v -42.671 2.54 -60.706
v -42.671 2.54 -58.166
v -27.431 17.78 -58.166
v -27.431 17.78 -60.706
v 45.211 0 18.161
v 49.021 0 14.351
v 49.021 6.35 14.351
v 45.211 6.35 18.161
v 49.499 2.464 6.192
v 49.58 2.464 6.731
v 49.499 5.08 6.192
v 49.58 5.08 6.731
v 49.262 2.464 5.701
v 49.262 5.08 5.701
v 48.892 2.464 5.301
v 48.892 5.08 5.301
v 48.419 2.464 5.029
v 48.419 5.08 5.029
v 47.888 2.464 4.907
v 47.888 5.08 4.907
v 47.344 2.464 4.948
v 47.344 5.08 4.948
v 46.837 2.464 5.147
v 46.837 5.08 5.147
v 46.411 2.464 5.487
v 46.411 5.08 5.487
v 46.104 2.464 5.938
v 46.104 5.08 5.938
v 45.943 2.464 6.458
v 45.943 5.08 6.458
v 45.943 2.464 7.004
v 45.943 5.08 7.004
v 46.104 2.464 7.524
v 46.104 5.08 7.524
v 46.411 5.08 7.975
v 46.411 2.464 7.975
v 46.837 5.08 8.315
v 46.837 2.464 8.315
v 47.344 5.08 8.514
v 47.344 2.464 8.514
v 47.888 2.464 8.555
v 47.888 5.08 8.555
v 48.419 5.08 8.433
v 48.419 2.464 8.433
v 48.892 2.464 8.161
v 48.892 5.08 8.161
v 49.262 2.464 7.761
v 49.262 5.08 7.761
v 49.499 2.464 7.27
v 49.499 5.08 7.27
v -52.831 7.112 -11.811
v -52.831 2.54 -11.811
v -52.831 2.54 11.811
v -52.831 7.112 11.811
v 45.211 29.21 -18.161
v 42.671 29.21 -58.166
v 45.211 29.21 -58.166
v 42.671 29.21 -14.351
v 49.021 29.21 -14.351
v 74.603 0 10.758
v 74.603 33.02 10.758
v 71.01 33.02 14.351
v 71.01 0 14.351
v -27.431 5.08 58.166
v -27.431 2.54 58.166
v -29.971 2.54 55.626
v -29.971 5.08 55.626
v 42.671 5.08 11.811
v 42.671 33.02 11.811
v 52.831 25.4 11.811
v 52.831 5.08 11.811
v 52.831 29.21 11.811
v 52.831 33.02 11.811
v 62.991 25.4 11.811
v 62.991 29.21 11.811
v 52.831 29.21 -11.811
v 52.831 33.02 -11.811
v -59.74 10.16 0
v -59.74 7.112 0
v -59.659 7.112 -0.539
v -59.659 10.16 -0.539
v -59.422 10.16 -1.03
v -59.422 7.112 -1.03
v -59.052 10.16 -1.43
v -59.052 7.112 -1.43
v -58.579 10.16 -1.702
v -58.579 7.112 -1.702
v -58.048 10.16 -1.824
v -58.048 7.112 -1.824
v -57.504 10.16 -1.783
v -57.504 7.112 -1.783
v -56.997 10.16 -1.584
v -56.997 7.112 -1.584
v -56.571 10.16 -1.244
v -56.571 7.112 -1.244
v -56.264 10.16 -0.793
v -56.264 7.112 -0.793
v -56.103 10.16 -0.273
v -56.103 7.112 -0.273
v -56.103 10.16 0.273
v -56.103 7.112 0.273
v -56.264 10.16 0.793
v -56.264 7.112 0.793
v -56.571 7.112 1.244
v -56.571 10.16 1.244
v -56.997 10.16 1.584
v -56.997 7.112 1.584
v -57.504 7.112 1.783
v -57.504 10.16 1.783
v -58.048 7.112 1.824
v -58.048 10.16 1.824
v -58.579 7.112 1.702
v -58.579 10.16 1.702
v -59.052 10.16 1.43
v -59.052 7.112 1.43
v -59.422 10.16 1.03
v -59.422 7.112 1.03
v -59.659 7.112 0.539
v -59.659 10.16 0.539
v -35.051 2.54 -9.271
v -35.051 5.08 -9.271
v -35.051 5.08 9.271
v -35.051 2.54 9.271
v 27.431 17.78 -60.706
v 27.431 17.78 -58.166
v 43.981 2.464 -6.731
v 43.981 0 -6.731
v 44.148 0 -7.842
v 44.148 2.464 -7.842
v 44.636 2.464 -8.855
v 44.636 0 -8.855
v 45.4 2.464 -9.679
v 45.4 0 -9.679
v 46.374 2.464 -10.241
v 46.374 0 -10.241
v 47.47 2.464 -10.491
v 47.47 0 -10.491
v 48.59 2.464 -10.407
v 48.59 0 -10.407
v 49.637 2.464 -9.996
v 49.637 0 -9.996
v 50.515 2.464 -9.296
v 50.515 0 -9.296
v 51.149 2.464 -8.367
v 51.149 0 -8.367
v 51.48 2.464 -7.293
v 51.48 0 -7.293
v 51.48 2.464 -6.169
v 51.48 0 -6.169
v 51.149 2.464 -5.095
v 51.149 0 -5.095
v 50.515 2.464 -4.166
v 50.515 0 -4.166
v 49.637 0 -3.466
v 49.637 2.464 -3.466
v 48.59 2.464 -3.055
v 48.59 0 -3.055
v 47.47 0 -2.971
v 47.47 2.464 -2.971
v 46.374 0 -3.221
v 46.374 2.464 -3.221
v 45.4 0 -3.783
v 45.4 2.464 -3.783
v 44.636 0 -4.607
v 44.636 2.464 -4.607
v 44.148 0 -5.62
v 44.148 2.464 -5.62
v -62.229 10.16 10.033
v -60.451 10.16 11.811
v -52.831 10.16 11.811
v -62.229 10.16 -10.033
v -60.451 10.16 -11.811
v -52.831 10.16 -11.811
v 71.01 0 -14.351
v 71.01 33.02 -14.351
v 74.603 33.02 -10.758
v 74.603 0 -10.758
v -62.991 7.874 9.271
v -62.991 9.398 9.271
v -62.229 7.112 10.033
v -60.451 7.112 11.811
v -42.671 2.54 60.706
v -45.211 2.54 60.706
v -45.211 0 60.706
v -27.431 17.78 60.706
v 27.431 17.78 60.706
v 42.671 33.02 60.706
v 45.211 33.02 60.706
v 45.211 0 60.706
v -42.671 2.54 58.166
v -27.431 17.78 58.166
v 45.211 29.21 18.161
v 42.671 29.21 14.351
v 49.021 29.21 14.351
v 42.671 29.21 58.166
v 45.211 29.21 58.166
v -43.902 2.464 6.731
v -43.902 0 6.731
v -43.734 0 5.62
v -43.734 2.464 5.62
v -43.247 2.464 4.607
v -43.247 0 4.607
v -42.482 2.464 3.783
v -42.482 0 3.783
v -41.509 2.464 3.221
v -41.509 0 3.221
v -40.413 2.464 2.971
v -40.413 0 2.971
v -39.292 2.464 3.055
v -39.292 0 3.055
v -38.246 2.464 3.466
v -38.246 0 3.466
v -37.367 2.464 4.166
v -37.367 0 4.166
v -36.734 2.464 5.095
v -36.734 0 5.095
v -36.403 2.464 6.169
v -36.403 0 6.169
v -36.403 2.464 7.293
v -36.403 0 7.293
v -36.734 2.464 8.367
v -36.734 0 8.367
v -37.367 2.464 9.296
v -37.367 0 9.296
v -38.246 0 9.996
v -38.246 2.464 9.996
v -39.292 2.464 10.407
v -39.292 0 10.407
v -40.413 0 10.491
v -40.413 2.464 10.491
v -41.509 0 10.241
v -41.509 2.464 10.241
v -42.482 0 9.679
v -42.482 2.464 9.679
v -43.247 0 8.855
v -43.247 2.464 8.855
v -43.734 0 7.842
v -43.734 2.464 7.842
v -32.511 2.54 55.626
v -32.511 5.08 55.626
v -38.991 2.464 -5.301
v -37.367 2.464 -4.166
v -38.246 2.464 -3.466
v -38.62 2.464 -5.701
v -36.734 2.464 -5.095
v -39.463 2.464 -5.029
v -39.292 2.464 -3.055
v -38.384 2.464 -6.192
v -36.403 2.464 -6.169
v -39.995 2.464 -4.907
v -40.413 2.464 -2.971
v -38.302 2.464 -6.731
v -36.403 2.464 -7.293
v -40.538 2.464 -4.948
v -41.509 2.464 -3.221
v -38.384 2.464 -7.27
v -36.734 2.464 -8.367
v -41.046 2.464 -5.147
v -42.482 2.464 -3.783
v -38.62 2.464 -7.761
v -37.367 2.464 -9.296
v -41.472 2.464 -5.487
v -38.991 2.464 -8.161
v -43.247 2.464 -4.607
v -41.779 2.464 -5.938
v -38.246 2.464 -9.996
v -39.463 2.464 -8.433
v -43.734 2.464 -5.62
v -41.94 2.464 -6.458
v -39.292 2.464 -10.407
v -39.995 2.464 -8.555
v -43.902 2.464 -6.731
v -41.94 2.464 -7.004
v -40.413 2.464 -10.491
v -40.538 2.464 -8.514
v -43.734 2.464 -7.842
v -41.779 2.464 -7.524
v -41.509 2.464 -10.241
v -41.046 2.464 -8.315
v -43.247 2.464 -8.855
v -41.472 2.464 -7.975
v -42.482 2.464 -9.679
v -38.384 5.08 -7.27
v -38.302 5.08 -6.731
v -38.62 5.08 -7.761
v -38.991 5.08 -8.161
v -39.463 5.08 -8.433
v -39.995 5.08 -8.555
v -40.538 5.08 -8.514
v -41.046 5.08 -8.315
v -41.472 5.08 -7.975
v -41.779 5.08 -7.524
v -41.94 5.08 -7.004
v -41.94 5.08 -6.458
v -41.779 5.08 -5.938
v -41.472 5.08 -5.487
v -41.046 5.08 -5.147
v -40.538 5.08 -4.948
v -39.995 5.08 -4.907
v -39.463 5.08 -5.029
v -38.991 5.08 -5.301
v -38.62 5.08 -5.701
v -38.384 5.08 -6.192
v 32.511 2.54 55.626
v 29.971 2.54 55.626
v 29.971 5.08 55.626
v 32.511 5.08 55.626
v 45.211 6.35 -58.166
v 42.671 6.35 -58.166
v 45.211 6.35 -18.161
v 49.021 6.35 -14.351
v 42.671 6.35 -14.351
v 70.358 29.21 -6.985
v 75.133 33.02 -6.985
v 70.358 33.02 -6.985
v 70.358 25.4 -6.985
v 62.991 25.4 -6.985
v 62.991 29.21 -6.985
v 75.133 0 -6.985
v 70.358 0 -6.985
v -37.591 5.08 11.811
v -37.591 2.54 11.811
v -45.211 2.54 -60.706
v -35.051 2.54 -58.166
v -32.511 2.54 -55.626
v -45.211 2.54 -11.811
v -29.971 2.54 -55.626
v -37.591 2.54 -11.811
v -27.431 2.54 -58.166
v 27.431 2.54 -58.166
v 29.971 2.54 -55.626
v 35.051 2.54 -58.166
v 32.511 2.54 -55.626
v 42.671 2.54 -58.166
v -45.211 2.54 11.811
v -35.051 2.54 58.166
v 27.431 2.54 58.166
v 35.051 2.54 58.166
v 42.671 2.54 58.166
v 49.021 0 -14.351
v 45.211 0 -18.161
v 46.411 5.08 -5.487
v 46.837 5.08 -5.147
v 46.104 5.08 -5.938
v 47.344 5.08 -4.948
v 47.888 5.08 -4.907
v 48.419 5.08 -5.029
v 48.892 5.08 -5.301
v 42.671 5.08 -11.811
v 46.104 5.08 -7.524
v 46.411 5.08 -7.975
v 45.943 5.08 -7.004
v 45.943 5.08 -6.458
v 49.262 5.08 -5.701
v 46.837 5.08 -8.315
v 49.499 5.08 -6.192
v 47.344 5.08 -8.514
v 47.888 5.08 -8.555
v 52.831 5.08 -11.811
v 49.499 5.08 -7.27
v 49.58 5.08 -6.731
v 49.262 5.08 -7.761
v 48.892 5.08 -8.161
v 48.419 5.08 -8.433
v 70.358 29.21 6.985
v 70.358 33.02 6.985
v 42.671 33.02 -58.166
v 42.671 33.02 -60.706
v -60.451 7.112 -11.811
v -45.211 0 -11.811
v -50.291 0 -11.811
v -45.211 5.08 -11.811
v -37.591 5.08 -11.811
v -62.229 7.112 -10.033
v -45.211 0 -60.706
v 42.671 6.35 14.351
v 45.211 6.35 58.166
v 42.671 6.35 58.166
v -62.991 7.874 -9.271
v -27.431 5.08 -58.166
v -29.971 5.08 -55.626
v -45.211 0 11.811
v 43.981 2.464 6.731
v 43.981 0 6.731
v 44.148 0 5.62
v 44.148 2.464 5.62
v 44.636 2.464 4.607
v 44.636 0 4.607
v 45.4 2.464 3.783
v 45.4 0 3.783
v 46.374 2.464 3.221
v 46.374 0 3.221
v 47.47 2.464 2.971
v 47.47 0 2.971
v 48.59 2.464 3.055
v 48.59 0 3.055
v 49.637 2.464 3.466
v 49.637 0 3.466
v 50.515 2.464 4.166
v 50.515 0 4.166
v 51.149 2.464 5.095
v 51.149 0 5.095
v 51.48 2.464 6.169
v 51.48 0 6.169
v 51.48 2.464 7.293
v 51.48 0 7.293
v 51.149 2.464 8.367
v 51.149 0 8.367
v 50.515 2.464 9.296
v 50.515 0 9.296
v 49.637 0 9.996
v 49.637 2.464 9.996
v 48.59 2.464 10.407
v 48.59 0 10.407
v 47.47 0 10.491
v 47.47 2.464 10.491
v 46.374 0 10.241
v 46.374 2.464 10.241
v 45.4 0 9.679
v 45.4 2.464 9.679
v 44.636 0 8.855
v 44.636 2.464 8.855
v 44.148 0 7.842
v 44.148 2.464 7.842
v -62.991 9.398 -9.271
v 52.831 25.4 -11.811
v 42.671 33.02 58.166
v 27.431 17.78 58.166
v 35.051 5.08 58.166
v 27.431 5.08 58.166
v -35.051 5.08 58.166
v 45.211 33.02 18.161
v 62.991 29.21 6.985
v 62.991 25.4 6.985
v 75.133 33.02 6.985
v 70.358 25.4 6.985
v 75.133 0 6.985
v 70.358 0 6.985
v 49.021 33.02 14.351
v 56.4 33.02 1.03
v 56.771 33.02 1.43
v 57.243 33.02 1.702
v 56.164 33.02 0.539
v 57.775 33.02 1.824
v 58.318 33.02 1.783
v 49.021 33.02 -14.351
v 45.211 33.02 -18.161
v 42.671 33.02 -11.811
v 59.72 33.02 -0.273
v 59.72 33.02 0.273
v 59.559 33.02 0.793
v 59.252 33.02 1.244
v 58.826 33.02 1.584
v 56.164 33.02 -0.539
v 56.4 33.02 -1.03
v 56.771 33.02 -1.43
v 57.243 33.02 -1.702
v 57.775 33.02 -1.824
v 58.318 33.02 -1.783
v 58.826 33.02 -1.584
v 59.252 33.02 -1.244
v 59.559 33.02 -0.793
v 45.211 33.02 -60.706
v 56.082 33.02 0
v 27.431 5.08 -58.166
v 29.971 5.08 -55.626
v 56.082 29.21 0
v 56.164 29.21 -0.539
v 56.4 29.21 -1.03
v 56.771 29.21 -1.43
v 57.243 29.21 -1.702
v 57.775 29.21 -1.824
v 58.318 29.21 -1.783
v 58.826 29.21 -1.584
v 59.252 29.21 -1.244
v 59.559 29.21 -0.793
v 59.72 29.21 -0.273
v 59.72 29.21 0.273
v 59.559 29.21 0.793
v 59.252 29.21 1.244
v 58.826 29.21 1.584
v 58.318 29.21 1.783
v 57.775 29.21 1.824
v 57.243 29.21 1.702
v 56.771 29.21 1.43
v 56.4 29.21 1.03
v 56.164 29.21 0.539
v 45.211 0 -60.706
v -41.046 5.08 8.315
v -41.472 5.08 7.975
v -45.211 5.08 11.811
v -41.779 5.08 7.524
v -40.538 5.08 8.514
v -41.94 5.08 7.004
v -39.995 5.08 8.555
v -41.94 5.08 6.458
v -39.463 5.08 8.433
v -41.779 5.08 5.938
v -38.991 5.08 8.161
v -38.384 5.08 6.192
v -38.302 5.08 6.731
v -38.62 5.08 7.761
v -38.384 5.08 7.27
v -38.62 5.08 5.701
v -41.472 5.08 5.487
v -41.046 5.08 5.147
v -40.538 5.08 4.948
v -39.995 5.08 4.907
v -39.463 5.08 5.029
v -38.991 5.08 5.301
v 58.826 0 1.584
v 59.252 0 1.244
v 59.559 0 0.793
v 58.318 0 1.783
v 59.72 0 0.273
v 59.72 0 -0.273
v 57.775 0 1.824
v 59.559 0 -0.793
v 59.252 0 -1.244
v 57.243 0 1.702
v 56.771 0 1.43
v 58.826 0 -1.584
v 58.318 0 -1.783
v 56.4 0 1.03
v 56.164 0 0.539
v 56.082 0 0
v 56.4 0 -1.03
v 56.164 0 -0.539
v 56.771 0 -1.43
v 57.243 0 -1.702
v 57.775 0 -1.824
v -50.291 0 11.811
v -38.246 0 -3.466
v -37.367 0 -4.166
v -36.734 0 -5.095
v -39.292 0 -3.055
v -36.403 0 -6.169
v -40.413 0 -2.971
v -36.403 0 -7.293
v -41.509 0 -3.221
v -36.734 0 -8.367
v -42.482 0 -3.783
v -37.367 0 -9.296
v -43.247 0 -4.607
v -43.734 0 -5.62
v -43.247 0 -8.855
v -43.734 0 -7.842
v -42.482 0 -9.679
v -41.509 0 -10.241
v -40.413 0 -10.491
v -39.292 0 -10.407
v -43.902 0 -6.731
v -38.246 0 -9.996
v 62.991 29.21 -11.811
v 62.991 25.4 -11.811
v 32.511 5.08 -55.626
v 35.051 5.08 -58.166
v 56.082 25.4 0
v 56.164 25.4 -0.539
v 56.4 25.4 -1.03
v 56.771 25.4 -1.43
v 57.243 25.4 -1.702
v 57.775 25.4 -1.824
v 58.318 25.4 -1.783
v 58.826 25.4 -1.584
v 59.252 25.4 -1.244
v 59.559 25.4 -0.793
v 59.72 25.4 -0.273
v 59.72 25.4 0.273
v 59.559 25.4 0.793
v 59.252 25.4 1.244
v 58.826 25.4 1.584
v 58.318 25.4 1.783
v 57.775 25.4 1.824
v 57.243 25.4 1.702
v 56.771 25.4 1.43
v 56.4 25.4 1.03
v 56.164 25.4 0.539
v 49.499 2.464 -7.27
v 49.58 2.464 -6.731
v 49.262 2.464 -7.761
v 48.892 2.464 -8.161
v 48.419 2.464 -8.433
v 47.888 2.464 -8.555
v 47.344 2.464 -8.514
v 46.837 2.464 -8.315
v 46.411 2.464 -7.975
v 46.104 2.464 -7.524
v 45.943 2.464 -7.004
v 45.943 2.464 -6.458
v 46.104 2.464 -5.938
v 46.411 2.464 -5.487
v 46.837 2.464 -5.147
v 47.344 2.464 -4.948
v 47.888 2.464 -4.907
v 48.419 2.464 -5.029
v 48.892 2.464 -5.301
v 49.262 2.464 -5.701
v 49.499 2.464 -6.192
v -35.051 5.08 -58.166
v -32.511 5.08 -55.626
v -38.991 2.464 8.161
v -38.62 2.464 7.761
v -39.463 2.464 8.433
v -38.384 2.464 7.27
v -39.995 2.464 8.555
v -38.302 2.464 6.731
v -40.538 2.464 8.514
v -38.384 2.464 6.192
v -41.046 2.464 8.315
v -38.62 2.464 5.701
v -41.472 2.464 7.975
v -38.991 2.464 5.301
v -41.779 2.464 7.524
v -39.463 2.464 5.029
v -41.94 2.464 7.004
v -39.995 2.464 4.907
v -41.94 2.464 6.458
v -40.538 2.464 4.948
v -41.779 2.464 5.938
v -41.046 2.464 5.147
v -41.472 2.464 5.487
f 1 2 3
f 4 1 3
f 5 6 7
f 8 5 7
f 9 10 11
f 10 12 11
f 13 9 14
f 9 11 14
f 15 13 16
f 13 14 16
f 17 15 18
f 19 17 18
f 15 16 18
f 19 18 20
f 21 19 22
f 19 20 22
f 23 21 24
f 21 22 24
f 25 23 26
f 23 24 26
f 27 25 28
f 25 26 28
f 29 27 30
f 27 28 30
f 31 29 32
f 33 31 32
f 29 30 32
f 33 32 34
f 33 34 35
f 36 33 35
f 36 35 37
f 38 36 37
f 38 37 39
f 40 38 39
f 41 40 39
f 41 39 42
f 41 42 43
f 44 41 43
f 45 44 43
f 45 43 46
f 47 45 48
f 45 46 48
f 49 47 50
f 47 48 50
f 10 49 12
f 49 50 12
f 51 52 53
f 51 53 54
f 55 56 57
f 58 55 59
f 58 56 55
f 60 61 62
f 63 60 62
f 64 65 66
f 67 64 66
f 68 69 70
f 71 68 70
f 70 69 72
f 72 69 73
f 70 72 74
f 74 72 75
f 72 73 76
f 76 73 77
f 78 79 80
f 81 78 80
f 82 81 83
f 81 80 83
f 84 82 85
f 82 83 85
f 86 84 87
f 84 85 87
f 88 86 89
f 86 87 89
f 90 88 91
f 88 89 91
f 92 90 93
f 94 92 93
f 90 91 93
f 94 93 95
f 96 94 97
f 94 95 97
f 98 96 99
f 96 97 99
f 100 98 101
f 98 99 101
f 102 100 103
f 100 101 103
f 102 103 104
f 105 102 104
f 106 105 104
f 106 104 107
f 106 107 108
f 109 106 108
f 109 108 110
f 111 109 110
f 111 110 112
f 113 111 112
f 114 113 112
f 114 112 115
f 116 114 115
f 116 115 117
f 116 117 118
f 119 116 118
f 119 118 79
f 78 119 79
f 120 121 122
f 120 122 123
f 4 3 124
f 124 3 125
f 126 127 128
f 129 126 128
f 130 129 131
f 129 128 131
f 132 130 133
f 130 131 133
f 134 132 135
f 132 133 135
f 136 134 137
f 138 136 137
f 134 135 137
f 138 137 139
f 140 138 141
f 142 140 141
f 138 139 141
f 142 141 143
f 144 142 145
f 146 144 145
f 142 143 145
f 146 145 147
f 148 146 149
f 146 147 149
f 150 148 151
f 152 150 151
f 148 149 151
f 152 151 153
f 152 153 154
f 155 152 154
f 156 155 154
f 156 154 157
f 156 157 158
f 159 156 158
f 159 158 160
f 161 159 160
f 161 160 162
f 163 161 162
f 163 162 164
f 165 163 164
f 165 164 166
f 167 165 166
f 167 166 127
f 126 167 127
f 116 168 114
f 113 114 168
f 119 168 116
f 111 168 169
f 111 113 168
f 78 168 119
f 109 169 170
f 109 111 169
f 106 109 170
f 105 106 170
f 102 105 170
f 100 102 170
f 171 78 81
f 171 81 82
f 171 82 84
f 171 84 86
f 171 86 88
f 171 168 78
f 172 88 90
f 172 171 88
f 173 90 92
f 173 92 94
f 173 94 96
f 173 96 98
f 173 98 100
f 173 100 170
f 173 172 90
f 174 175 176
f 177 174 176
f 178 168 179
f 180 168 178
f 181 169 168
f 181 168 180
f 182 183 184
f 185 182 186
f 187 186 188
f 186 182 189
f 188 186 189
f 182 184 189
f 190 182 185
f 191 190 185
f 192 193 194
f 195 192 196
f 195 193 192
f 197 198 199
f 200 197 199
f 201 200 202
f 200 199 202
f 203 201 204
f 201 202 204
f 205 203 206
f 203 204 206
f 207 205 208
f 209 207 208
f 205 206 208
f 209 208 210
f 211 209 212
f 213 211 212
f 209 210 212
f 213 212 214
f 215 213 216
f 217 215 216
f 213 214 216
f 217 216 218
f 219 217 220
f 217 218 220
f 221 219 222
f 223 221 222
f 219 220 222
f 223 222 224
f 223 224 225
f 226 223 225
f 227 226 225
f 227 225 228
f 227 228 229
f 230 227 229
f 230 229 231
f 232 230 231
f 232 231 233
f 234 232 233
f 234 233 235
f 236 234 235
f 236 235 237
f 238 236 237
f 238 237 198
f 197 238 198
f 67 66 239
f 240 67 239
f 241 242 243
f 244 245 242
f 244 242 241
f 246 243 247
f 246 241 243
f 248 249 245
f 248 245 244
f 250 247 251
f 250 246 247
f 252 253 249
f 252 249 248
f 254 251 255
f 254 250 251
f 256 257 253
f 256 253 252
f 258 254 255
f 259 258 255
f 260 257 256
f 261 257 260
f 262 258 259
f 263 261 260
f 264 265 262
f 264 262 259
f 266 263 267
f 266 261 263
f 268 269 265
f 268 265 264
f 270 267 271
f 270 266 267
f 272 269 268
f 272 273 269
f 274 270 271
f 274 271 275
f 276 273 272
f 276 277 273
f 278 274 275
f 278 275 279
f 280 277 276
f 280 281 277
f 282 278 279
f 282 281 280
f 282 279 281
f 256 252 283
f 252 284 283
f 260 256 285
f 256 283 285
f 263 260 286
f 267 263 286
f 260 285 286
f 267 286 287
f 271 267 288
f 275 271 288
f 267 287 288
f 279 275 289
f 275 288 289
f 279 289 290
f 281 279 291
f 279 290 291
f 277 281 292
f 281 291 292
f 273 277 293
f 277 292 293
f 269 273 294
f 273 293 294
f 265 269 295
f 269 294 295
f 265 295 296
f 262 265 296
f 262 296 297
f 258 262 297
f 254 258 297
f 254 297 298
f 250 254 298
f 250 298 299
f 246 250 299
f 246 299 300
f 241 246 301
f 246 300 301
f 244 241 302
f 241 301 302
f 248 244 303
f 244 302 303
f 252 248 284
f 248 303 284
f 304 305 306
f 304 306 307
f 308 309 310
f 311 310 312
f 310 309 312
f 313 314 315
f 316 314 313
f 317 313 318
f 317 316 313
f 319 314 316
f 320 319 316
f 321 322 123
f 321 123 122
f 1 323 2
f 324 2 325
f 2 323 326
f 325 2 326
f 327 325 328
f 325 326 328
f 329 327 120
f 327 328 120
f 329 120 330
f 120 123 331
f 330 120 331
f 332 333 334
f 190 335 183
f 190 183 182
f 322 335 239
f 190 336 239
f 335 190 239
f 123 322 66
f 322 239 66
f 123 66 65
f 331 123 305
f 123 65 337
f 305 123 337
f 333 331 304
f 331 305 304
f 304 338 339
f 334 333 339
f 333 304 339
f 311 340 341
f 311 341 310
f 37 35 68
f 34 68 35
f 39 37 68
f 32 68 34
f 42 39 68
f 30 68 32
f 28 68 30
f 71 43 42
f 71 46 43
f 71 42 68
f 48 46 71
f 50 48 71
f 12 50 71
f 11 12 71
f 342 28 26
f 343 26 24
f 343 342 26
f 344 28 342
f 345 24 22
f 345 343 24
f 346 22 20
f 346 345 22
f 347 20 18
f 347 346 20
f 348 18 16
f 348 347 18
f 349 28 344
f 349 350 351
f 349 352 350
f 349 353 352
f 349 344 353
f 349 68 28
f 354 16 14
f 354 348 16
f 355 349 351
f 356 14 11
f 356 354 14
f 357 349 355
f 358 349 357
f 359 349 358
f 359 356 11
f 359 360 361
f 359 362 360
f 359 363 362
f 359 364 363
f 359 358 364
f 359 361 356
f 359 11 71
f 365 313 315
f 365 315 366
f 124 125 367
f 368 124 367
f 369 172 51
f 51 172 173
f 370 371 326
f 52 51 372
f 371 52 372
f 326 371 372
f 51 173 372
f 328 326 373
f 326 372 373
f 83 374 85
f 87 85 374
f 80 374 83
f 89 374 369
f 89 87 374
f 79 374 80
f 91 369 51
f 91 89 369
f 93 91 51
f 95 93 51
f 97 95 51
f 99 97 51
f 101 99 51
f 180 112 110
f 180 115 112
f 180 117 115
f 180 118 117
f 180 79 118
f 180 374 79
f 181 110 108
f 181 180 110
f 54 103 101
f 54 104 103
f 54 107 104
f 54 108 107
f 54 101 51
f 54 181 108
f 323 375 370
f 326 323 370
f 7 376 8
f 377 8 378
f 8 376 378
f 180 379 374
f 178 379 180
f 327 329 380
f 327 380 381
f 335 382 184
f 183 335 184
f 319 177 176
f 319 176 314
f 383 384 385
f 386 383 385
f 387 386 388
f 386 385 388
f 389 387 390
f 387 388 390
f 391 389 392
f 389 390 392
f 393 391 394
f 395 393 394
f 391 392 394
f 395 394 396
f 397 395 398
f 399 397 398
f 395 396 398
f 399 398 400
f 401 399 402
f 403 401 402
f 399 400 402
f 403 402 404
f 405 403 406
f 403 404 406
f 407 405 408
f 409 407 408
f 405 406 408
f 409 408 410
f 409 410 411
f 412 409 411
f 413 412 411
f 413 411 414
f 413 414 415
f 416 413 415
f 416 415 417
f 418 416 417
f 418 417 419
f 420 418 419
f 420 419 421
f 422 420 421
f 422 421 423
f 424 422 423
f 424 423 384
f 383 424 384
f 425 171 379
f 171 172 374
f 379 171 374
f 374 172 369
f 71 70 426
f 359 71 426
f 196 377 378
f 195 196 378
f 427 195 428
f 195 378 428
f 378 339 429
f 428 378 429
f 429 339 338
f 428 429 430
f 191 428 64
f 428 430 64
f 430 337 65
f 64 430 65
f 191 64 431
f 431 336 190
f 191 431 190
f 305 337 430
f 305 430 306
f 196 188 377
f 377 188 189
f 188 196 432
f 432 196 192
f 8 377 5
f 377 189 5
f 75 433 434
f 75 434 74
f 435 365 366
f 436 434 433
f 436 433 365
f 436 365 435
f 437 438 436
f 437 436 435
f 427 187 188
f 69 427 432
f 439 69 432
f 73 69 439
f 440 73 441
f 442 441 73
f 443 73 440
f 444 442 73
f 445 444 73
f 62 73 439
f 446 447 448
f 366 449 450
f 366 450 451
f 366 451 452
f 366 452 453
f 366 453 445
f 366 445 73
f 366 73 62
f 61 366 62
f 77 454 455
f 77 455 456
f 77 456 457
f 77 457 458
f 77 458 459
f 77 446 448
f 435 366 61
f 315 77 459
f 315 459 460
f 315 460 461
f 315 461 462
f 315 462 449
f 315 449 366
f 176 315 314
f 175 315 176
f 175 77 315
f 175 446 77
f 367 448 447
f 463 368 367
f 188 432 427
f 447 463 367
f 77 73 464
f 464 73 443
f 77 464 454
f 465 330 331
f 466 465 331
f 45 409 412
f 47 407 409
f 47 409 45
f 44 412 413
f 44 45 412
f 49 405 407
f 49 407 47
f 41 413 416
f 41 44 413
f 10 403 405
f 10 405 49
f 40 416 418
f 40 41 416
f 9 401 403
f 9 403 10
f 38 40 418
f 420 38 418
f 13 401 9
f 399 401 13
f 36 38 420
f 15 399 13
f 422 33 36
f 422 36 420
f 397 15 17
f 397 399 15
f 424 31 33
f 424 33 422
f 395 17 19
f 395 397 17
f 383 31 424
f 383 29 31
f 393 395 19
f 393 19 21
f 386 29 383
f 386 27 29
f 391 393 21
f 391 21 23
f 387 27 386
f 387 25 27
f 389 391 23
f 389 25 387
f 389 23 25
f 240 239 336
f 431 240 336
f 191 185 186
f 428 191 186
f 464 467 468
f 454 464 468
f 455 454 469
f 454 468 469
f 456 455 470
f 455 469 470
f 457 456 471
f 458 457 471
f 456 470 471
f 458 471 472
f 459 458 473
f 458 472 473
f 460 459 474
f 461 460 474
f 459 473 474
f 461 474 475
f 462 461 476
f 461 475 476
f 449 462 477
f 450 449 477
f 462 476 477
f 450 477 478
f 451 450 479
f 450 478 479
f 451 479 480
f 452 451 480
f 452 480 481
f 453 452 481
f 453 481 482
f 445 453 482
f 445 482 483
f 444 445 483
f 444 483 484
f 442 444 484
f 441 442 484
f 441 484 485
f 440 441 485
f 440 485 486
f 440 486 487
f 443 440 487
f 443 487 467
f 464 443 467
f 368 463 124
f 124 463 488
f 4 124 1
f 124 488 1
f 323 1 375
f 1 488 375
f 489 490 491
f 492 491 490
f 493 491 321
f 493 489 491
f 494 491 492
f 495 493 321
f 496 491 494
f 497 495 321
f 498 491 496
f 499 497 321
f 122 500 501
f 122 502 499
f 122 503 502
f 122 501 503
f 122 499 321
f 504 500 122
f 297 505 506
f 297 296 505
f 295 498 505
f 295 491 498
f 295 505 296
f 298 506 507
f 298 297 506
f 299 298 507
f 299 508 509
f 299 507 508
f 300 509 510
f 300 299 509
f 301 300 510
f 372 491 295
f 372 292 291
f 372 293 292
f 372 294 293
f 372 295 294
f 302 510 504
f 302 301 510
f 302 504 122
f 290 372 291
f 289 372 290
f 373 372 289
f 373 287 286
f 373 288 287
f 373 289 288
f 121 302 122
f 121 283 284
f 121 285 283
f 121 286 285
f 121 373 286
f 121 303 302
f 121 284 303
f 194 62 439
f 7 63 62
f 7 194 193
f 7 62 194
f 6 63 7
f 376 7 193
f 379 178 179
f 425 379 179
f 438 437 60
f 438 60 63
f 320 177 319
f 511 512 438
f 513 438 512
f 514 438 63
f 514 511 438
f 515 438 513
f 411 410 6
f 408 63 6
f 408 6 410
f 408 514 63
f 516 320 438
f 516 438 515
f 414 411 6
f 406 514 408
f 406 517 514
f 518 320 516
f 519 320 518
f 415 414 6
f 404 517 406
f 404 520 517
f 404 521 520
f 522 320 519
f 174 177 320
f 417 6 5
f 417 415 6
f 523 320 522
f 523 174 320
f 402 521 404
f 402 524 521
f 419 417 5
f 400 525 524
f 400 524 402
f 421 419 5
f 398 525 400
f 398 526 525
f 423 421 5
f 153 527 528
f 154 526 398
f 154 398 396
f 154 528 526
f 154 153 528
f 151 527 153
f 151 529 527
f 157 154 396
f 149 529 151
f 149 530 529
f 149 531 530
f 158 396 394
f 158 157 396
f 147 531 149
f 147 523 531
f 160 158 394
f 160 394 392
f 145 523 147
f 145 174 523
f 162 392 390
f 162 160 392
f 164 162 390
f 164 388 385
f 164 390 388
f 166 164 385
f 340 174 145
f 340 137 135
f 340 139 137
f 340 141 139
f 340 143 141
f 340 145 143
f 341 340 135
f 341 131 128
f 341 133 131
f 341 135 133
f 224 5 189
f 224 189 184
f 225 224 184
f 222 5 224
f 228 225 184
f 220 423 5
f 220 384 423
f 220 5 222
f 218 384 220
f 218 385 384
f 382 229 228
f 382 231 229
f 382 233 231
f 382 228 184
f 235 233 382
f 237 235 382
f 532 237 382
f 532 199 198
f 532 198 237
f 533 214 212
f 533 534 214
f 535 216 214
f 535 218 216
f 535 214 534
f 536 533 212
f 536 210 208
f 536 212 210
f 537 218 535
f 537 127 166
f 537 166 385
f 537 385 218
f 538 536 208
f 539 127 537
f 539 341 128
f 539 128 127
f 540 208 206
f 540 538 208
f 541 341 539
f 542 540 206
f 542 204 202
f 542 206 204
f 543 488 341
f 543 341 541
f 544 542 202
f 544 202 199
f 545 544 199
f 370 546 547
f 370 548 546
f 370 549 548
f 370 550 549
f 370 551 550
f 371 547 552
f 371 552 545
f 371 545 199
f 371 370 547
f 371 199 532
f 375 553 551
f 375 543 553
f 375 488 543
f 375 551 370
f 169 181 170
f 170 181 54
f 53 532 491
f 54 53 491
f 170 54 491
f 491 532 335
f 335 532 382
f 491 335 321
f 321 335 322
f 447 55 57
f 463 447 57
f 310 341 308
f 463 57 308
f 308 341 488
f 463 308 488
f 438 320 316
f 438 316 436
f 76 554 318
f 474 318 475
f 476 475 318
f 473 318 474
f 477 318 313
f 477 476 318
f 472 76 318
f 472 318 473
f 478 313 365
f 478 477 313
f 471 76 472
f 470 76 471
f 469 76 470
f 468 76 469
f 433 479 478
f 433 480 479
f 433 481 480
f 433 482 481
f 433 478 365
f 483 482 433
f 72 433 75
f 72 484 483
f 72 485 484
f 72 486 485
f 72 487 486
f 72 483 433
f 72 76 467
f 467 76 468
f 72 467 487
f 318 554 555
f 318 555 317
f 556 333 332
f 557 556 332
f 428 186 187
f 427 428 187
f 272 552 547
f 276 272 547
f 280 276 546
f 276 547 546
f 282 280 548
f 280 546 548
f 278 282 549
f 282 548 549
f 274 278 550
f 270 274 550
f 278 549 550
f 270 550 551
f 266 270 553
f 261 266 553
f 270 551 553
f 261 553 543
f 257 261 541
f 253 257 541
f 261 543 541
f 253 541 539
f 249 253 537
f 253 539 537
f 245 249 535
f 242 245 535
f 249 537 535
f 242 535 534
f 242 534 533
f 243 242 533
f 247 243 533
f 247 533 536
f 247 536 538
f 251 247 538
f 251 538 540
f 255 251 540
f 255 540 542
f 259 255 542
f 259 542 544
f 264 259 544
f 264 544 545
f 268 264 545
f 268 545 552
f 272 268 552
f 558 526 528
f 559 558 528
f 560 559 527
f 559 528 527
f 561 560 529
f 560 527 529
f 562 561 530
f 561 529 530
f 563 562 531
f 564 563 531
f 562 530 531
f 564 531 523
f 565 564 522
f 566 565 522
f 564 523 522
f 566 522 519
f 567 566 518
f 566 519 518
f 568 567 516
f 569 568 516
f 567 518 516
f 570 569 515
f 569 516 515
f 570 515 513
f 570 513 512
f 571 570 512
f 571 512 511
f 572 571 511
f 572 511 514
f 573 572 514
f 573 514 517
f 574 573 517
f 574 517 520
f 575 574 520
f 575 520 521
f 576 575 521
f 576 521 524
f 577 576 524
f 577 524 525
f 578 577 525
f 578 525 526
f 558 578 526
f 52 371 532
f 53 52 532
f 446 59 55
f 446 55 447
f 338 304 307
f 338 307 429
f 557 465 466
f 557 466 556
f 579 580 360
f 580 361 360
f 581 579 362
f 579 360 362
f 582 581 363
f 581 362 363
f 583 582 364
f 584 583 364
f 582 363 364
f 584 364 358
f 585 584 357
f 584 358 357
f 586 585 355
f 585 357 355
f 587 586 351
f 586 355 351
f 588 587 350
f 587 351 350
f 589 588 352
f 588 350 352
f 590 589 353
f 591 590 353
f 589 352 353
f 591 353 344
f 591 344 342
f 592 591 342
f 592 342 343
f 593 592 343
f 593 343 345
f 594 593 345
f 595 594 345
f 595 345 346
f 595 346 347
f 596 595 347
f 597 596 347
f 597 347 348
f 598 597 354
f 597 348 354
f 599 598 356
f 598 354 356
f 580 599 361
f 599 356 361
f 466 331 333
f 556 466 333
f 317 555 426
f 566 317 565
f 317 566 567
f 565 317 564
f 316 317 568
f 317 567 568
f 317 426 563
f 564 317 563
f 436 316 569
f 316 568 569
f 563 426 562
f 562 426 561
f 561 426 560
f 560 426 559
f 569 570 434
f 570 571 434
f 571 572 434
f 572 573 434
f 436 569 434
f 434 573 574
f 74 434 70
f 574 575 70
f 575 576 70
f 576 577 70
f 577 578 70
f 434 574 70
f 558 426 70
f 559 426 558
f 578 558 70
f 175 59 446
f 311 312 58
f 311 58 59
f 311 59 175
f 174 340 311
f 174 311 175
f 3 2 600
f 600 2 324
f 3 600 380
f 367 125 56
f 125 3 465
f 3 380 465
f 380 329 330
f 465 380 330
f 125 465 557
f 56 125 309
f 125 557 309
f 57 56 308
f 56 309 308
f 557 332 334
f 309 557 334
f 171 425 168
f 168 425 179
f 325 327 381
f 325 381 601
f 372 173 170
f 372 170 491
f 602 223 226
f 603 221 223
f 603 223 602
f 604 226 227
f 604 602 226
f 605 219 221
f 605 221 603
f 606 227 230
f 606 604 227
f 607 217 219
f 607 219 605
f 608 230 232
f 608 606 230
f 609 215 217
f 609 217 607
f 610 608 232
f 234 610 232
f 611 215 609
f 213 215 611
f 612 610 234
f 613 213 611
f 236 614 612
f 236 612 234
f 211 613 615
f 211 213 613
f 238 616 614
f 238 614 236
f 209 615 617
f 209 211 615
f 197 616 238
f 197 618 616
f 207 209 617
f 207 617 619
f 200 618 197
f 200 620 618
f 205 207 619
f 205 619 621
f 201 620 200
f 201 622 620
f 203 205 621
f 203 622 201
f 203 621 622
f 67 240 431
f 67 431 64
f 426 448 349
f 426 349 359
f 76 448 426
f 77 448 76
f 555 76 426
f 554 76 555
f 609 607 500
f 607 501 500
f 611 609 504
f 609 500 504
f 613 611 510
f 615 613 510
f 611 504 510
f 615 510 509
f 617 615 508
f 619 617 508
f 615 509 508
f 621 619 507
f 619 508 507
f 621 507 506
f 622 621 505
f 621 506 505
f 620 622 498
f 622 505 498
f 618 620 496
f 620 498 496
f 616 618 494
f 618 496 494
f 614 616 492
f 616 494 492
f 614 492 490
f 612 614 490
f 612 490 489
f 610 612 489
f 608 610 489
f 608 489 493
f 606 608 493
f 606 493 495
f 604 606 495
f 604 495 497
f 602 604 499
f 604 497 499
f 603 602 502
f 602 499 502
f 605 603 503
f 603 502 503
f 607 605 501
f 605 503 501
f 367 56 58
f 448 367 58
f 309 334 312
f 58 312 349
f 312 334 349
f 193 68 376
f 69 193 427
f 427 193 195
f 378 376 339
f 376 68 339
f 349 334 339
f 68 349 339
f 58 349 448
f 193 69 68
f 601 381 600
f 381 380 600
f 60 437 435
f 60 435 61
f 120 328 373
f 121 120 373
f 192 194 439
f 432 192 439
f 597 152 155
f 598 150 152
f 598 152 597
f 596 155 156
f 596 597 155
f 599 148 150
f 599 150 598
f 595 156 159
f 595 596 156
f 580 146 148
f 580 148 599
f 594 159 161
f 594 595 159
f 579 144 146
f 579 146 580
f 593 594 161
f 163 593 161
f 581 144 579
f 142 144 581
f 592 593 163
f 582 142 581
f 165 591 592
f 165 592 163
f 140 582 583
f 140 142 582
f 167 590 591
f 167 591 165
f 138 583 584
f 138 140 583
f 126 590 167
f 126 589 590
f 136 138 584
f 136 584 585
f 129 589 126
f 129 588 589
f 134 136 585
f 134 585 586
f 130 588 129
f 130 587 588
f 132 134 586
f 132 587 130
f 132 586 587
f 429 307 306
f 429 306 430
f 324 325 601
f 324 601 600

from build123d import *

# Parameters (mm, degrees)
SKETCH3_W                                       = 90.422573022
SKETCH3_H                                       = 121.412
BOSS_EXTRUDE4_DEPTH                             = 2.54
BOSS_EXTRUDE5_DEPTH                             = 30.48
CUT_EXTRUDE2_DEPTH                              = 122.412
BOSS_EXTRUDE6_DEPTH                             = 33.02
SKETCH9_W                                       = 10.16
SKETCH9_H                                       = 23.622
CUT_EXTRUDE3_DEPTH                              = 27.94
BOSS_EXTRUDE7_DEPTH                             = 2.54
SKETCH12_W                                      = 23.622
SKETCH12_H                                      = 3.81
CUT_EXTRUDE4_DEPTH                              = 10.16
SKETCH13_W                                      = 13.97
SKETCH13_H                                      = 3.81
CUT_EXTRUDE5_DEPTH                              = 13.141913489
BOSS_EXTRUDE9_REACH                             = 62.706
BOSS_EXTRUDE9_DIRECTION_2_REACH                 = 62.706
CBORE_FOR_6_PAN_HEAD_MACHINE_SCREW1_D           = 3.6576
CBORE_FOR_6_PAN_HEAD_MACHINE_SCREW1_CBORE_D     = 7.54126
CBORE_FOR_6_PAN_HEAD_MACHINE_SCREW1_CBORE_DEPTH = 2.4638
F_6_CLEARANCE_HOLE1_D                           = 3.6576
SKETCH21_W                                      = 43.815
SKETCH21_H                                      = 22.86
CUT_EXTRUDE6_DEPTH                              = 33.461913489
CHAMFER1_SIZE                                   = 2.54
CHAMFER2_SIZE                                   = 3.81
SKETCH23_W                                      = 10.16
SKETCH23_H                                      = 23.622
CUT_EXTRUDE8_DEPTH                              = 0.762
CHAMFER3_SIZE                                   = 0.762


with BuildPart() as part:
    # Sketch3 → Boss-Extrude4 (new body)
    with BuildSketch(Plane(origin=(0, 0, 0), x_dir=(1, 0, 0), z_dir=(0, 1, 0))):
        Rectangle(SKETCH3_W, SKETCH3_H)
    extrude(amount=BOSS_EXTRUDE4_DEPTH)

    # Sketch6 → Boss-Extrude5 (add)
    with BuildSketch(Plane(origin=(0, 2.54, 0), x_dir=(1, 0, 0), z_dir=(0, 1, 0))):
        Polygon((45.211286511, -60.706), (45.211286511, 60.706), (-45.211286511, 60.706), (-45.211286511, 58.166), (42.671286511, 58.166), (42.671286511, -58.166), (-45.211286511, -58.166), (-45.211286511, -60.706), align=None)
    extrude(amount=BOSS_EXTRUDE5_DEPTH)

    # Sketch7 → Cut-Extrude2 (cut, through all)
    with BuildSketch(Plane.XY.offset(60.706)):
        Polygon((-42.671286511, 2.54), (-27.431286511, 17.78), (27.431286511, 17.78), (42.671286511, 33.02), (-45.211286511, 33.02), (-45.211286511, 2.54), align=None)
    extrude(amount=-CUT_EXTRUDE2_DEPTH, mode=Mode.SUBTRACT)

    # Sketch8 → Boss-Extrude6 (add)
    with BuildSketch(Plane(origin=(0, 0, 0), x_dir=(1, 0, 0), z_dir=(0, 1, 0))):
        Polygon((45.211286511, 14.351), (71.009871827, 14.351), (74.602950485, 10.757921342), (75.1332, 6.985), (70.358, 6.985), (70.358, -6.985), (75.1332, -6.985), (74.602950485, -10.757921342), (71.009871827, -14.351), (45.211286511, -14.351), align=None)
    extrude(amount=BOSS_EXTRUDE6_DEPTH)

    # Sketch9 → Cut-Extrude3 (cut)
    with BuildSketch(Plane(origin=(0, 33.02, 0), x_dir=(1, 0, 0), z_dir=(0, 1, 0))):
        with Locations((47.751286511, 0)):
            Rectangle(SKETCH9_W, SKETCH9_H)
    extrude(amount=-CUT_EXTRUDE3_DEPTH, mode=Mode.SUBTRACT)

    # Sketch11 → Boss-Extrude7 (add)
    with BuildSketch(Plane(origin=(0, 2.54, 0), x_dir=(1, 0, 0), z_dir=(0, 1, 0))):
        Polygon((35.051286511, 58.166), (27.431286511, 58.166), (29.971286511, 55.626), (32.511286511, 55.626), align=None)
        Polygon((-29.971286511, 55.626), (-32.511286511, 55.626), (-35.051286511, 58.166), (-27.431286511, 58.166), align=None)
        Polygon((29.971286511, -55.626), (32.511286511, -55.626), (35.051286511, -58.166), (27.431286511, -58.166), align=None)
        Polygon((-27.431286511, -58.166), (-29.971286511, -55.626), (-32.511286511, -55.626), (-35.051286511, -58.166), align=None)
    extrude(amount=BOSS_EXTRUDE7_DEPTH)

    # Sketch12 → Cut-Extrude4 (cut)
    with BuildSketch(Plane.ZY.offset(-52.831286511)):
        with Locations((0, 27.305)):
            Rectangle(SKETCH12_W, SKETCH12_H)
    extrude(amount=-CUT_EXTRUDE4_DEPTH, mode=Mode.SUBTRACT)

    # Sketch13 → Cut-Extrude5 (cut, through all)
    with BuildSketch(Plane.ZY.offset(-62.991286511)):
        with Locations((0, 27.305)):
            Rectangle(SKETCH13_W, SKETCH13_H)
    extrude(amount=-CUT_EXTRUDE5_DEPTH, mode=Mode.SUBTRACT)

    # Boss-Extrude9: up to this face of the body (flat: up to its plane)
    boss_extrude9_end = Plane(part.part.faces().sort_by_distance((48.970486511, 20.0406, -11.811))[0])
    # Sketch15 → Boss-Extrude9 (add, up to the picked face)
    with BuildSketch(Plane.XY, mode=Mode.PRIVATE) as boss_extrude9_sk1:
        Polygon((-62.991286511, 10.16), (-52.831286511, 10.16), (-45.211286511, 5.08), (-35.051286511, 5.08), (-35.051286511, 2.54), (-45.211286511, 2.54), (-45.211286511, 0), (-52.831286511, 0), (-52.831286511, 6.35), (-62.991286511, 6.35), align=None)
    boss_extrude9_tool1 = split(extrude(boss_extrude9_sk1.sketch, amount=-BOSS_EXTRUDE9_REACH, mode=Mode.PRIVATE), bisect_by=boss_extrude9_end, keep=Keep.BOTH, mode=Mode.PRIVATE)
    add(boss_extrude9_tool1.solids().sort_by_distance((-50.157602, 5.280526, 0))[0])

    # Boss-Extrude9 direction 2: up to this face of the body (flat: up to its plane)
    boss_extrude9_direction_2_end = Plane(part.part.faces().sort_by_distance((48.970486511, 20.0406, 11.811))[0])
    # Sketch15 → Boss-Extrude9 direction 2 (add, up to the picked face)
    with BuildSketch(Plane.XY, mode=Mode.PRIVATE) as boss_extrude9_direction_2_sk1:
        Polygon((-62.991286511, 10.16), (-52.831286511, 10.16), (-45.211286511, 5.08), (-35.051286511, 5.08), (-35.051286511, 2.54), (-45.211286511, 2.54), (-45.211286511, 0), (-52.831286511, 0), (-52.831286511, 6.35), (-62.991286511, 6.35), align=None)
    boss_extrude9_direction_2_tool1 = split(extrude(boss_extrude9_direction_2_sk1.sketch, amount=BOSS_EXTRUDE9_DIRECTION_2_REACH, mode=Mode.PRIVATE), bisect_by=boss_extrude9_direction_2_end, keep=Keep.BOTH, mode=Mode.PRIVATE)
    add(boss_extrude9_direction_2_tool1.solids().sort_by_distance((-50.157602, 5.280526, 0))[0])

    # CBORE for #6 Pan Head Machine Screw1 (through all)
    with Locations(Plane(origin=(0, 0, 0), x_dir=(-1, 0, 0), z_dir=(0, -1, 0))):
        with Locations((-47.751286511, 6.731), (-47.751286511, -6.731), (40.131286511, 6.731), (40.131286511, -6.731)):
            CounterBoreHole(CBORE_FOR_6_PAN_HEAD_MACHINE_SCREW1_D / 2, CBORE_FOR_6_PAN_HEAD_MACHINE_SCREW1_CBORE_D / 2, CBORE_FOR_6_PAN_HEAD_MACHINE_SCREW1_CBORE_DEPTH)

    # #6 Clearance Hole1 (through all)
    with Locations(Plane(origin=(0, 33.02, 0), x_dir=(1, 0, 0), z_dir=(0, 1, 0))):
        with Locations((-57.911286511, 0), (57.911286511, 0)):
            Hole(F_6_CLEARANCE_HOLE1_D / 2)

    # Sketch21 → Cut-Extrude6 (cut, through all)
    with BuildSketch(Plane.ZY.offset(-42.671286511)):
        with Locations((-36.2585, 17.78)):
            Rectangle(SKETCH21_W, SKETCH21_H)
        with Locations((36.2585, 17.78)):
            Rectangle(SKETCH21_W, SKETCH21_H)
    extrude(amount=-CUT_EXTRUDE6_DEPTH, mode=Mode.SUBTRACT)

    # Chamfer1
    chamfer1_edges = [part.edges().sort_by_distance(p)[0] for p in [
        (-52.831286511, 0, 0),
        (-35.051286511, 3.81, -11.811),
        (-62.991286511, 8.255, -11.811),
        (-62.991286511, 8.255, 11.811),
        (-35.051286511, 3.81, 11.811),
    ]]
    chamfer(chamfer1_edges, length=CHAMFER1_SIZE)

    # Chamfer2
    chamfer2_edges = [part.edges().sort_by_distance(p)[0] for p in [
        (45.211286511, 3.175, -14.351),
        (45.211286511, 3.175, 14.351),
        (45.211286511, 31.115, -14.351),
        (45.211286511, 31.115, 14.351),
    ]]
    chamfer(chamfer2_edges, length=CHAMFER2_SIZE)

    # Sketch23 → Cut-Extrude8 (cut)
    with BuildSketch(Plane.XZ.offset(-6.35)):
        with Locations((-57.911286511, 0)):
            Rectangle(SKETCH23_W, SKETCH23_H)
    extrude(amount=-CUT_EXTRUDE8_DEPTH, mode=Mode.SUBTRACT)

    # Chamfer3
    chamfer3_edges = [part.edges().sort_by_distance(p)[0] for p in [
        (-62.991286511, 10.16, 0),
        (-62.991286511, 7.112, 0),
    ]]
    chamfer(chamfer3_edges, length=CHAMFER3_SIZE)


solid = part.part
